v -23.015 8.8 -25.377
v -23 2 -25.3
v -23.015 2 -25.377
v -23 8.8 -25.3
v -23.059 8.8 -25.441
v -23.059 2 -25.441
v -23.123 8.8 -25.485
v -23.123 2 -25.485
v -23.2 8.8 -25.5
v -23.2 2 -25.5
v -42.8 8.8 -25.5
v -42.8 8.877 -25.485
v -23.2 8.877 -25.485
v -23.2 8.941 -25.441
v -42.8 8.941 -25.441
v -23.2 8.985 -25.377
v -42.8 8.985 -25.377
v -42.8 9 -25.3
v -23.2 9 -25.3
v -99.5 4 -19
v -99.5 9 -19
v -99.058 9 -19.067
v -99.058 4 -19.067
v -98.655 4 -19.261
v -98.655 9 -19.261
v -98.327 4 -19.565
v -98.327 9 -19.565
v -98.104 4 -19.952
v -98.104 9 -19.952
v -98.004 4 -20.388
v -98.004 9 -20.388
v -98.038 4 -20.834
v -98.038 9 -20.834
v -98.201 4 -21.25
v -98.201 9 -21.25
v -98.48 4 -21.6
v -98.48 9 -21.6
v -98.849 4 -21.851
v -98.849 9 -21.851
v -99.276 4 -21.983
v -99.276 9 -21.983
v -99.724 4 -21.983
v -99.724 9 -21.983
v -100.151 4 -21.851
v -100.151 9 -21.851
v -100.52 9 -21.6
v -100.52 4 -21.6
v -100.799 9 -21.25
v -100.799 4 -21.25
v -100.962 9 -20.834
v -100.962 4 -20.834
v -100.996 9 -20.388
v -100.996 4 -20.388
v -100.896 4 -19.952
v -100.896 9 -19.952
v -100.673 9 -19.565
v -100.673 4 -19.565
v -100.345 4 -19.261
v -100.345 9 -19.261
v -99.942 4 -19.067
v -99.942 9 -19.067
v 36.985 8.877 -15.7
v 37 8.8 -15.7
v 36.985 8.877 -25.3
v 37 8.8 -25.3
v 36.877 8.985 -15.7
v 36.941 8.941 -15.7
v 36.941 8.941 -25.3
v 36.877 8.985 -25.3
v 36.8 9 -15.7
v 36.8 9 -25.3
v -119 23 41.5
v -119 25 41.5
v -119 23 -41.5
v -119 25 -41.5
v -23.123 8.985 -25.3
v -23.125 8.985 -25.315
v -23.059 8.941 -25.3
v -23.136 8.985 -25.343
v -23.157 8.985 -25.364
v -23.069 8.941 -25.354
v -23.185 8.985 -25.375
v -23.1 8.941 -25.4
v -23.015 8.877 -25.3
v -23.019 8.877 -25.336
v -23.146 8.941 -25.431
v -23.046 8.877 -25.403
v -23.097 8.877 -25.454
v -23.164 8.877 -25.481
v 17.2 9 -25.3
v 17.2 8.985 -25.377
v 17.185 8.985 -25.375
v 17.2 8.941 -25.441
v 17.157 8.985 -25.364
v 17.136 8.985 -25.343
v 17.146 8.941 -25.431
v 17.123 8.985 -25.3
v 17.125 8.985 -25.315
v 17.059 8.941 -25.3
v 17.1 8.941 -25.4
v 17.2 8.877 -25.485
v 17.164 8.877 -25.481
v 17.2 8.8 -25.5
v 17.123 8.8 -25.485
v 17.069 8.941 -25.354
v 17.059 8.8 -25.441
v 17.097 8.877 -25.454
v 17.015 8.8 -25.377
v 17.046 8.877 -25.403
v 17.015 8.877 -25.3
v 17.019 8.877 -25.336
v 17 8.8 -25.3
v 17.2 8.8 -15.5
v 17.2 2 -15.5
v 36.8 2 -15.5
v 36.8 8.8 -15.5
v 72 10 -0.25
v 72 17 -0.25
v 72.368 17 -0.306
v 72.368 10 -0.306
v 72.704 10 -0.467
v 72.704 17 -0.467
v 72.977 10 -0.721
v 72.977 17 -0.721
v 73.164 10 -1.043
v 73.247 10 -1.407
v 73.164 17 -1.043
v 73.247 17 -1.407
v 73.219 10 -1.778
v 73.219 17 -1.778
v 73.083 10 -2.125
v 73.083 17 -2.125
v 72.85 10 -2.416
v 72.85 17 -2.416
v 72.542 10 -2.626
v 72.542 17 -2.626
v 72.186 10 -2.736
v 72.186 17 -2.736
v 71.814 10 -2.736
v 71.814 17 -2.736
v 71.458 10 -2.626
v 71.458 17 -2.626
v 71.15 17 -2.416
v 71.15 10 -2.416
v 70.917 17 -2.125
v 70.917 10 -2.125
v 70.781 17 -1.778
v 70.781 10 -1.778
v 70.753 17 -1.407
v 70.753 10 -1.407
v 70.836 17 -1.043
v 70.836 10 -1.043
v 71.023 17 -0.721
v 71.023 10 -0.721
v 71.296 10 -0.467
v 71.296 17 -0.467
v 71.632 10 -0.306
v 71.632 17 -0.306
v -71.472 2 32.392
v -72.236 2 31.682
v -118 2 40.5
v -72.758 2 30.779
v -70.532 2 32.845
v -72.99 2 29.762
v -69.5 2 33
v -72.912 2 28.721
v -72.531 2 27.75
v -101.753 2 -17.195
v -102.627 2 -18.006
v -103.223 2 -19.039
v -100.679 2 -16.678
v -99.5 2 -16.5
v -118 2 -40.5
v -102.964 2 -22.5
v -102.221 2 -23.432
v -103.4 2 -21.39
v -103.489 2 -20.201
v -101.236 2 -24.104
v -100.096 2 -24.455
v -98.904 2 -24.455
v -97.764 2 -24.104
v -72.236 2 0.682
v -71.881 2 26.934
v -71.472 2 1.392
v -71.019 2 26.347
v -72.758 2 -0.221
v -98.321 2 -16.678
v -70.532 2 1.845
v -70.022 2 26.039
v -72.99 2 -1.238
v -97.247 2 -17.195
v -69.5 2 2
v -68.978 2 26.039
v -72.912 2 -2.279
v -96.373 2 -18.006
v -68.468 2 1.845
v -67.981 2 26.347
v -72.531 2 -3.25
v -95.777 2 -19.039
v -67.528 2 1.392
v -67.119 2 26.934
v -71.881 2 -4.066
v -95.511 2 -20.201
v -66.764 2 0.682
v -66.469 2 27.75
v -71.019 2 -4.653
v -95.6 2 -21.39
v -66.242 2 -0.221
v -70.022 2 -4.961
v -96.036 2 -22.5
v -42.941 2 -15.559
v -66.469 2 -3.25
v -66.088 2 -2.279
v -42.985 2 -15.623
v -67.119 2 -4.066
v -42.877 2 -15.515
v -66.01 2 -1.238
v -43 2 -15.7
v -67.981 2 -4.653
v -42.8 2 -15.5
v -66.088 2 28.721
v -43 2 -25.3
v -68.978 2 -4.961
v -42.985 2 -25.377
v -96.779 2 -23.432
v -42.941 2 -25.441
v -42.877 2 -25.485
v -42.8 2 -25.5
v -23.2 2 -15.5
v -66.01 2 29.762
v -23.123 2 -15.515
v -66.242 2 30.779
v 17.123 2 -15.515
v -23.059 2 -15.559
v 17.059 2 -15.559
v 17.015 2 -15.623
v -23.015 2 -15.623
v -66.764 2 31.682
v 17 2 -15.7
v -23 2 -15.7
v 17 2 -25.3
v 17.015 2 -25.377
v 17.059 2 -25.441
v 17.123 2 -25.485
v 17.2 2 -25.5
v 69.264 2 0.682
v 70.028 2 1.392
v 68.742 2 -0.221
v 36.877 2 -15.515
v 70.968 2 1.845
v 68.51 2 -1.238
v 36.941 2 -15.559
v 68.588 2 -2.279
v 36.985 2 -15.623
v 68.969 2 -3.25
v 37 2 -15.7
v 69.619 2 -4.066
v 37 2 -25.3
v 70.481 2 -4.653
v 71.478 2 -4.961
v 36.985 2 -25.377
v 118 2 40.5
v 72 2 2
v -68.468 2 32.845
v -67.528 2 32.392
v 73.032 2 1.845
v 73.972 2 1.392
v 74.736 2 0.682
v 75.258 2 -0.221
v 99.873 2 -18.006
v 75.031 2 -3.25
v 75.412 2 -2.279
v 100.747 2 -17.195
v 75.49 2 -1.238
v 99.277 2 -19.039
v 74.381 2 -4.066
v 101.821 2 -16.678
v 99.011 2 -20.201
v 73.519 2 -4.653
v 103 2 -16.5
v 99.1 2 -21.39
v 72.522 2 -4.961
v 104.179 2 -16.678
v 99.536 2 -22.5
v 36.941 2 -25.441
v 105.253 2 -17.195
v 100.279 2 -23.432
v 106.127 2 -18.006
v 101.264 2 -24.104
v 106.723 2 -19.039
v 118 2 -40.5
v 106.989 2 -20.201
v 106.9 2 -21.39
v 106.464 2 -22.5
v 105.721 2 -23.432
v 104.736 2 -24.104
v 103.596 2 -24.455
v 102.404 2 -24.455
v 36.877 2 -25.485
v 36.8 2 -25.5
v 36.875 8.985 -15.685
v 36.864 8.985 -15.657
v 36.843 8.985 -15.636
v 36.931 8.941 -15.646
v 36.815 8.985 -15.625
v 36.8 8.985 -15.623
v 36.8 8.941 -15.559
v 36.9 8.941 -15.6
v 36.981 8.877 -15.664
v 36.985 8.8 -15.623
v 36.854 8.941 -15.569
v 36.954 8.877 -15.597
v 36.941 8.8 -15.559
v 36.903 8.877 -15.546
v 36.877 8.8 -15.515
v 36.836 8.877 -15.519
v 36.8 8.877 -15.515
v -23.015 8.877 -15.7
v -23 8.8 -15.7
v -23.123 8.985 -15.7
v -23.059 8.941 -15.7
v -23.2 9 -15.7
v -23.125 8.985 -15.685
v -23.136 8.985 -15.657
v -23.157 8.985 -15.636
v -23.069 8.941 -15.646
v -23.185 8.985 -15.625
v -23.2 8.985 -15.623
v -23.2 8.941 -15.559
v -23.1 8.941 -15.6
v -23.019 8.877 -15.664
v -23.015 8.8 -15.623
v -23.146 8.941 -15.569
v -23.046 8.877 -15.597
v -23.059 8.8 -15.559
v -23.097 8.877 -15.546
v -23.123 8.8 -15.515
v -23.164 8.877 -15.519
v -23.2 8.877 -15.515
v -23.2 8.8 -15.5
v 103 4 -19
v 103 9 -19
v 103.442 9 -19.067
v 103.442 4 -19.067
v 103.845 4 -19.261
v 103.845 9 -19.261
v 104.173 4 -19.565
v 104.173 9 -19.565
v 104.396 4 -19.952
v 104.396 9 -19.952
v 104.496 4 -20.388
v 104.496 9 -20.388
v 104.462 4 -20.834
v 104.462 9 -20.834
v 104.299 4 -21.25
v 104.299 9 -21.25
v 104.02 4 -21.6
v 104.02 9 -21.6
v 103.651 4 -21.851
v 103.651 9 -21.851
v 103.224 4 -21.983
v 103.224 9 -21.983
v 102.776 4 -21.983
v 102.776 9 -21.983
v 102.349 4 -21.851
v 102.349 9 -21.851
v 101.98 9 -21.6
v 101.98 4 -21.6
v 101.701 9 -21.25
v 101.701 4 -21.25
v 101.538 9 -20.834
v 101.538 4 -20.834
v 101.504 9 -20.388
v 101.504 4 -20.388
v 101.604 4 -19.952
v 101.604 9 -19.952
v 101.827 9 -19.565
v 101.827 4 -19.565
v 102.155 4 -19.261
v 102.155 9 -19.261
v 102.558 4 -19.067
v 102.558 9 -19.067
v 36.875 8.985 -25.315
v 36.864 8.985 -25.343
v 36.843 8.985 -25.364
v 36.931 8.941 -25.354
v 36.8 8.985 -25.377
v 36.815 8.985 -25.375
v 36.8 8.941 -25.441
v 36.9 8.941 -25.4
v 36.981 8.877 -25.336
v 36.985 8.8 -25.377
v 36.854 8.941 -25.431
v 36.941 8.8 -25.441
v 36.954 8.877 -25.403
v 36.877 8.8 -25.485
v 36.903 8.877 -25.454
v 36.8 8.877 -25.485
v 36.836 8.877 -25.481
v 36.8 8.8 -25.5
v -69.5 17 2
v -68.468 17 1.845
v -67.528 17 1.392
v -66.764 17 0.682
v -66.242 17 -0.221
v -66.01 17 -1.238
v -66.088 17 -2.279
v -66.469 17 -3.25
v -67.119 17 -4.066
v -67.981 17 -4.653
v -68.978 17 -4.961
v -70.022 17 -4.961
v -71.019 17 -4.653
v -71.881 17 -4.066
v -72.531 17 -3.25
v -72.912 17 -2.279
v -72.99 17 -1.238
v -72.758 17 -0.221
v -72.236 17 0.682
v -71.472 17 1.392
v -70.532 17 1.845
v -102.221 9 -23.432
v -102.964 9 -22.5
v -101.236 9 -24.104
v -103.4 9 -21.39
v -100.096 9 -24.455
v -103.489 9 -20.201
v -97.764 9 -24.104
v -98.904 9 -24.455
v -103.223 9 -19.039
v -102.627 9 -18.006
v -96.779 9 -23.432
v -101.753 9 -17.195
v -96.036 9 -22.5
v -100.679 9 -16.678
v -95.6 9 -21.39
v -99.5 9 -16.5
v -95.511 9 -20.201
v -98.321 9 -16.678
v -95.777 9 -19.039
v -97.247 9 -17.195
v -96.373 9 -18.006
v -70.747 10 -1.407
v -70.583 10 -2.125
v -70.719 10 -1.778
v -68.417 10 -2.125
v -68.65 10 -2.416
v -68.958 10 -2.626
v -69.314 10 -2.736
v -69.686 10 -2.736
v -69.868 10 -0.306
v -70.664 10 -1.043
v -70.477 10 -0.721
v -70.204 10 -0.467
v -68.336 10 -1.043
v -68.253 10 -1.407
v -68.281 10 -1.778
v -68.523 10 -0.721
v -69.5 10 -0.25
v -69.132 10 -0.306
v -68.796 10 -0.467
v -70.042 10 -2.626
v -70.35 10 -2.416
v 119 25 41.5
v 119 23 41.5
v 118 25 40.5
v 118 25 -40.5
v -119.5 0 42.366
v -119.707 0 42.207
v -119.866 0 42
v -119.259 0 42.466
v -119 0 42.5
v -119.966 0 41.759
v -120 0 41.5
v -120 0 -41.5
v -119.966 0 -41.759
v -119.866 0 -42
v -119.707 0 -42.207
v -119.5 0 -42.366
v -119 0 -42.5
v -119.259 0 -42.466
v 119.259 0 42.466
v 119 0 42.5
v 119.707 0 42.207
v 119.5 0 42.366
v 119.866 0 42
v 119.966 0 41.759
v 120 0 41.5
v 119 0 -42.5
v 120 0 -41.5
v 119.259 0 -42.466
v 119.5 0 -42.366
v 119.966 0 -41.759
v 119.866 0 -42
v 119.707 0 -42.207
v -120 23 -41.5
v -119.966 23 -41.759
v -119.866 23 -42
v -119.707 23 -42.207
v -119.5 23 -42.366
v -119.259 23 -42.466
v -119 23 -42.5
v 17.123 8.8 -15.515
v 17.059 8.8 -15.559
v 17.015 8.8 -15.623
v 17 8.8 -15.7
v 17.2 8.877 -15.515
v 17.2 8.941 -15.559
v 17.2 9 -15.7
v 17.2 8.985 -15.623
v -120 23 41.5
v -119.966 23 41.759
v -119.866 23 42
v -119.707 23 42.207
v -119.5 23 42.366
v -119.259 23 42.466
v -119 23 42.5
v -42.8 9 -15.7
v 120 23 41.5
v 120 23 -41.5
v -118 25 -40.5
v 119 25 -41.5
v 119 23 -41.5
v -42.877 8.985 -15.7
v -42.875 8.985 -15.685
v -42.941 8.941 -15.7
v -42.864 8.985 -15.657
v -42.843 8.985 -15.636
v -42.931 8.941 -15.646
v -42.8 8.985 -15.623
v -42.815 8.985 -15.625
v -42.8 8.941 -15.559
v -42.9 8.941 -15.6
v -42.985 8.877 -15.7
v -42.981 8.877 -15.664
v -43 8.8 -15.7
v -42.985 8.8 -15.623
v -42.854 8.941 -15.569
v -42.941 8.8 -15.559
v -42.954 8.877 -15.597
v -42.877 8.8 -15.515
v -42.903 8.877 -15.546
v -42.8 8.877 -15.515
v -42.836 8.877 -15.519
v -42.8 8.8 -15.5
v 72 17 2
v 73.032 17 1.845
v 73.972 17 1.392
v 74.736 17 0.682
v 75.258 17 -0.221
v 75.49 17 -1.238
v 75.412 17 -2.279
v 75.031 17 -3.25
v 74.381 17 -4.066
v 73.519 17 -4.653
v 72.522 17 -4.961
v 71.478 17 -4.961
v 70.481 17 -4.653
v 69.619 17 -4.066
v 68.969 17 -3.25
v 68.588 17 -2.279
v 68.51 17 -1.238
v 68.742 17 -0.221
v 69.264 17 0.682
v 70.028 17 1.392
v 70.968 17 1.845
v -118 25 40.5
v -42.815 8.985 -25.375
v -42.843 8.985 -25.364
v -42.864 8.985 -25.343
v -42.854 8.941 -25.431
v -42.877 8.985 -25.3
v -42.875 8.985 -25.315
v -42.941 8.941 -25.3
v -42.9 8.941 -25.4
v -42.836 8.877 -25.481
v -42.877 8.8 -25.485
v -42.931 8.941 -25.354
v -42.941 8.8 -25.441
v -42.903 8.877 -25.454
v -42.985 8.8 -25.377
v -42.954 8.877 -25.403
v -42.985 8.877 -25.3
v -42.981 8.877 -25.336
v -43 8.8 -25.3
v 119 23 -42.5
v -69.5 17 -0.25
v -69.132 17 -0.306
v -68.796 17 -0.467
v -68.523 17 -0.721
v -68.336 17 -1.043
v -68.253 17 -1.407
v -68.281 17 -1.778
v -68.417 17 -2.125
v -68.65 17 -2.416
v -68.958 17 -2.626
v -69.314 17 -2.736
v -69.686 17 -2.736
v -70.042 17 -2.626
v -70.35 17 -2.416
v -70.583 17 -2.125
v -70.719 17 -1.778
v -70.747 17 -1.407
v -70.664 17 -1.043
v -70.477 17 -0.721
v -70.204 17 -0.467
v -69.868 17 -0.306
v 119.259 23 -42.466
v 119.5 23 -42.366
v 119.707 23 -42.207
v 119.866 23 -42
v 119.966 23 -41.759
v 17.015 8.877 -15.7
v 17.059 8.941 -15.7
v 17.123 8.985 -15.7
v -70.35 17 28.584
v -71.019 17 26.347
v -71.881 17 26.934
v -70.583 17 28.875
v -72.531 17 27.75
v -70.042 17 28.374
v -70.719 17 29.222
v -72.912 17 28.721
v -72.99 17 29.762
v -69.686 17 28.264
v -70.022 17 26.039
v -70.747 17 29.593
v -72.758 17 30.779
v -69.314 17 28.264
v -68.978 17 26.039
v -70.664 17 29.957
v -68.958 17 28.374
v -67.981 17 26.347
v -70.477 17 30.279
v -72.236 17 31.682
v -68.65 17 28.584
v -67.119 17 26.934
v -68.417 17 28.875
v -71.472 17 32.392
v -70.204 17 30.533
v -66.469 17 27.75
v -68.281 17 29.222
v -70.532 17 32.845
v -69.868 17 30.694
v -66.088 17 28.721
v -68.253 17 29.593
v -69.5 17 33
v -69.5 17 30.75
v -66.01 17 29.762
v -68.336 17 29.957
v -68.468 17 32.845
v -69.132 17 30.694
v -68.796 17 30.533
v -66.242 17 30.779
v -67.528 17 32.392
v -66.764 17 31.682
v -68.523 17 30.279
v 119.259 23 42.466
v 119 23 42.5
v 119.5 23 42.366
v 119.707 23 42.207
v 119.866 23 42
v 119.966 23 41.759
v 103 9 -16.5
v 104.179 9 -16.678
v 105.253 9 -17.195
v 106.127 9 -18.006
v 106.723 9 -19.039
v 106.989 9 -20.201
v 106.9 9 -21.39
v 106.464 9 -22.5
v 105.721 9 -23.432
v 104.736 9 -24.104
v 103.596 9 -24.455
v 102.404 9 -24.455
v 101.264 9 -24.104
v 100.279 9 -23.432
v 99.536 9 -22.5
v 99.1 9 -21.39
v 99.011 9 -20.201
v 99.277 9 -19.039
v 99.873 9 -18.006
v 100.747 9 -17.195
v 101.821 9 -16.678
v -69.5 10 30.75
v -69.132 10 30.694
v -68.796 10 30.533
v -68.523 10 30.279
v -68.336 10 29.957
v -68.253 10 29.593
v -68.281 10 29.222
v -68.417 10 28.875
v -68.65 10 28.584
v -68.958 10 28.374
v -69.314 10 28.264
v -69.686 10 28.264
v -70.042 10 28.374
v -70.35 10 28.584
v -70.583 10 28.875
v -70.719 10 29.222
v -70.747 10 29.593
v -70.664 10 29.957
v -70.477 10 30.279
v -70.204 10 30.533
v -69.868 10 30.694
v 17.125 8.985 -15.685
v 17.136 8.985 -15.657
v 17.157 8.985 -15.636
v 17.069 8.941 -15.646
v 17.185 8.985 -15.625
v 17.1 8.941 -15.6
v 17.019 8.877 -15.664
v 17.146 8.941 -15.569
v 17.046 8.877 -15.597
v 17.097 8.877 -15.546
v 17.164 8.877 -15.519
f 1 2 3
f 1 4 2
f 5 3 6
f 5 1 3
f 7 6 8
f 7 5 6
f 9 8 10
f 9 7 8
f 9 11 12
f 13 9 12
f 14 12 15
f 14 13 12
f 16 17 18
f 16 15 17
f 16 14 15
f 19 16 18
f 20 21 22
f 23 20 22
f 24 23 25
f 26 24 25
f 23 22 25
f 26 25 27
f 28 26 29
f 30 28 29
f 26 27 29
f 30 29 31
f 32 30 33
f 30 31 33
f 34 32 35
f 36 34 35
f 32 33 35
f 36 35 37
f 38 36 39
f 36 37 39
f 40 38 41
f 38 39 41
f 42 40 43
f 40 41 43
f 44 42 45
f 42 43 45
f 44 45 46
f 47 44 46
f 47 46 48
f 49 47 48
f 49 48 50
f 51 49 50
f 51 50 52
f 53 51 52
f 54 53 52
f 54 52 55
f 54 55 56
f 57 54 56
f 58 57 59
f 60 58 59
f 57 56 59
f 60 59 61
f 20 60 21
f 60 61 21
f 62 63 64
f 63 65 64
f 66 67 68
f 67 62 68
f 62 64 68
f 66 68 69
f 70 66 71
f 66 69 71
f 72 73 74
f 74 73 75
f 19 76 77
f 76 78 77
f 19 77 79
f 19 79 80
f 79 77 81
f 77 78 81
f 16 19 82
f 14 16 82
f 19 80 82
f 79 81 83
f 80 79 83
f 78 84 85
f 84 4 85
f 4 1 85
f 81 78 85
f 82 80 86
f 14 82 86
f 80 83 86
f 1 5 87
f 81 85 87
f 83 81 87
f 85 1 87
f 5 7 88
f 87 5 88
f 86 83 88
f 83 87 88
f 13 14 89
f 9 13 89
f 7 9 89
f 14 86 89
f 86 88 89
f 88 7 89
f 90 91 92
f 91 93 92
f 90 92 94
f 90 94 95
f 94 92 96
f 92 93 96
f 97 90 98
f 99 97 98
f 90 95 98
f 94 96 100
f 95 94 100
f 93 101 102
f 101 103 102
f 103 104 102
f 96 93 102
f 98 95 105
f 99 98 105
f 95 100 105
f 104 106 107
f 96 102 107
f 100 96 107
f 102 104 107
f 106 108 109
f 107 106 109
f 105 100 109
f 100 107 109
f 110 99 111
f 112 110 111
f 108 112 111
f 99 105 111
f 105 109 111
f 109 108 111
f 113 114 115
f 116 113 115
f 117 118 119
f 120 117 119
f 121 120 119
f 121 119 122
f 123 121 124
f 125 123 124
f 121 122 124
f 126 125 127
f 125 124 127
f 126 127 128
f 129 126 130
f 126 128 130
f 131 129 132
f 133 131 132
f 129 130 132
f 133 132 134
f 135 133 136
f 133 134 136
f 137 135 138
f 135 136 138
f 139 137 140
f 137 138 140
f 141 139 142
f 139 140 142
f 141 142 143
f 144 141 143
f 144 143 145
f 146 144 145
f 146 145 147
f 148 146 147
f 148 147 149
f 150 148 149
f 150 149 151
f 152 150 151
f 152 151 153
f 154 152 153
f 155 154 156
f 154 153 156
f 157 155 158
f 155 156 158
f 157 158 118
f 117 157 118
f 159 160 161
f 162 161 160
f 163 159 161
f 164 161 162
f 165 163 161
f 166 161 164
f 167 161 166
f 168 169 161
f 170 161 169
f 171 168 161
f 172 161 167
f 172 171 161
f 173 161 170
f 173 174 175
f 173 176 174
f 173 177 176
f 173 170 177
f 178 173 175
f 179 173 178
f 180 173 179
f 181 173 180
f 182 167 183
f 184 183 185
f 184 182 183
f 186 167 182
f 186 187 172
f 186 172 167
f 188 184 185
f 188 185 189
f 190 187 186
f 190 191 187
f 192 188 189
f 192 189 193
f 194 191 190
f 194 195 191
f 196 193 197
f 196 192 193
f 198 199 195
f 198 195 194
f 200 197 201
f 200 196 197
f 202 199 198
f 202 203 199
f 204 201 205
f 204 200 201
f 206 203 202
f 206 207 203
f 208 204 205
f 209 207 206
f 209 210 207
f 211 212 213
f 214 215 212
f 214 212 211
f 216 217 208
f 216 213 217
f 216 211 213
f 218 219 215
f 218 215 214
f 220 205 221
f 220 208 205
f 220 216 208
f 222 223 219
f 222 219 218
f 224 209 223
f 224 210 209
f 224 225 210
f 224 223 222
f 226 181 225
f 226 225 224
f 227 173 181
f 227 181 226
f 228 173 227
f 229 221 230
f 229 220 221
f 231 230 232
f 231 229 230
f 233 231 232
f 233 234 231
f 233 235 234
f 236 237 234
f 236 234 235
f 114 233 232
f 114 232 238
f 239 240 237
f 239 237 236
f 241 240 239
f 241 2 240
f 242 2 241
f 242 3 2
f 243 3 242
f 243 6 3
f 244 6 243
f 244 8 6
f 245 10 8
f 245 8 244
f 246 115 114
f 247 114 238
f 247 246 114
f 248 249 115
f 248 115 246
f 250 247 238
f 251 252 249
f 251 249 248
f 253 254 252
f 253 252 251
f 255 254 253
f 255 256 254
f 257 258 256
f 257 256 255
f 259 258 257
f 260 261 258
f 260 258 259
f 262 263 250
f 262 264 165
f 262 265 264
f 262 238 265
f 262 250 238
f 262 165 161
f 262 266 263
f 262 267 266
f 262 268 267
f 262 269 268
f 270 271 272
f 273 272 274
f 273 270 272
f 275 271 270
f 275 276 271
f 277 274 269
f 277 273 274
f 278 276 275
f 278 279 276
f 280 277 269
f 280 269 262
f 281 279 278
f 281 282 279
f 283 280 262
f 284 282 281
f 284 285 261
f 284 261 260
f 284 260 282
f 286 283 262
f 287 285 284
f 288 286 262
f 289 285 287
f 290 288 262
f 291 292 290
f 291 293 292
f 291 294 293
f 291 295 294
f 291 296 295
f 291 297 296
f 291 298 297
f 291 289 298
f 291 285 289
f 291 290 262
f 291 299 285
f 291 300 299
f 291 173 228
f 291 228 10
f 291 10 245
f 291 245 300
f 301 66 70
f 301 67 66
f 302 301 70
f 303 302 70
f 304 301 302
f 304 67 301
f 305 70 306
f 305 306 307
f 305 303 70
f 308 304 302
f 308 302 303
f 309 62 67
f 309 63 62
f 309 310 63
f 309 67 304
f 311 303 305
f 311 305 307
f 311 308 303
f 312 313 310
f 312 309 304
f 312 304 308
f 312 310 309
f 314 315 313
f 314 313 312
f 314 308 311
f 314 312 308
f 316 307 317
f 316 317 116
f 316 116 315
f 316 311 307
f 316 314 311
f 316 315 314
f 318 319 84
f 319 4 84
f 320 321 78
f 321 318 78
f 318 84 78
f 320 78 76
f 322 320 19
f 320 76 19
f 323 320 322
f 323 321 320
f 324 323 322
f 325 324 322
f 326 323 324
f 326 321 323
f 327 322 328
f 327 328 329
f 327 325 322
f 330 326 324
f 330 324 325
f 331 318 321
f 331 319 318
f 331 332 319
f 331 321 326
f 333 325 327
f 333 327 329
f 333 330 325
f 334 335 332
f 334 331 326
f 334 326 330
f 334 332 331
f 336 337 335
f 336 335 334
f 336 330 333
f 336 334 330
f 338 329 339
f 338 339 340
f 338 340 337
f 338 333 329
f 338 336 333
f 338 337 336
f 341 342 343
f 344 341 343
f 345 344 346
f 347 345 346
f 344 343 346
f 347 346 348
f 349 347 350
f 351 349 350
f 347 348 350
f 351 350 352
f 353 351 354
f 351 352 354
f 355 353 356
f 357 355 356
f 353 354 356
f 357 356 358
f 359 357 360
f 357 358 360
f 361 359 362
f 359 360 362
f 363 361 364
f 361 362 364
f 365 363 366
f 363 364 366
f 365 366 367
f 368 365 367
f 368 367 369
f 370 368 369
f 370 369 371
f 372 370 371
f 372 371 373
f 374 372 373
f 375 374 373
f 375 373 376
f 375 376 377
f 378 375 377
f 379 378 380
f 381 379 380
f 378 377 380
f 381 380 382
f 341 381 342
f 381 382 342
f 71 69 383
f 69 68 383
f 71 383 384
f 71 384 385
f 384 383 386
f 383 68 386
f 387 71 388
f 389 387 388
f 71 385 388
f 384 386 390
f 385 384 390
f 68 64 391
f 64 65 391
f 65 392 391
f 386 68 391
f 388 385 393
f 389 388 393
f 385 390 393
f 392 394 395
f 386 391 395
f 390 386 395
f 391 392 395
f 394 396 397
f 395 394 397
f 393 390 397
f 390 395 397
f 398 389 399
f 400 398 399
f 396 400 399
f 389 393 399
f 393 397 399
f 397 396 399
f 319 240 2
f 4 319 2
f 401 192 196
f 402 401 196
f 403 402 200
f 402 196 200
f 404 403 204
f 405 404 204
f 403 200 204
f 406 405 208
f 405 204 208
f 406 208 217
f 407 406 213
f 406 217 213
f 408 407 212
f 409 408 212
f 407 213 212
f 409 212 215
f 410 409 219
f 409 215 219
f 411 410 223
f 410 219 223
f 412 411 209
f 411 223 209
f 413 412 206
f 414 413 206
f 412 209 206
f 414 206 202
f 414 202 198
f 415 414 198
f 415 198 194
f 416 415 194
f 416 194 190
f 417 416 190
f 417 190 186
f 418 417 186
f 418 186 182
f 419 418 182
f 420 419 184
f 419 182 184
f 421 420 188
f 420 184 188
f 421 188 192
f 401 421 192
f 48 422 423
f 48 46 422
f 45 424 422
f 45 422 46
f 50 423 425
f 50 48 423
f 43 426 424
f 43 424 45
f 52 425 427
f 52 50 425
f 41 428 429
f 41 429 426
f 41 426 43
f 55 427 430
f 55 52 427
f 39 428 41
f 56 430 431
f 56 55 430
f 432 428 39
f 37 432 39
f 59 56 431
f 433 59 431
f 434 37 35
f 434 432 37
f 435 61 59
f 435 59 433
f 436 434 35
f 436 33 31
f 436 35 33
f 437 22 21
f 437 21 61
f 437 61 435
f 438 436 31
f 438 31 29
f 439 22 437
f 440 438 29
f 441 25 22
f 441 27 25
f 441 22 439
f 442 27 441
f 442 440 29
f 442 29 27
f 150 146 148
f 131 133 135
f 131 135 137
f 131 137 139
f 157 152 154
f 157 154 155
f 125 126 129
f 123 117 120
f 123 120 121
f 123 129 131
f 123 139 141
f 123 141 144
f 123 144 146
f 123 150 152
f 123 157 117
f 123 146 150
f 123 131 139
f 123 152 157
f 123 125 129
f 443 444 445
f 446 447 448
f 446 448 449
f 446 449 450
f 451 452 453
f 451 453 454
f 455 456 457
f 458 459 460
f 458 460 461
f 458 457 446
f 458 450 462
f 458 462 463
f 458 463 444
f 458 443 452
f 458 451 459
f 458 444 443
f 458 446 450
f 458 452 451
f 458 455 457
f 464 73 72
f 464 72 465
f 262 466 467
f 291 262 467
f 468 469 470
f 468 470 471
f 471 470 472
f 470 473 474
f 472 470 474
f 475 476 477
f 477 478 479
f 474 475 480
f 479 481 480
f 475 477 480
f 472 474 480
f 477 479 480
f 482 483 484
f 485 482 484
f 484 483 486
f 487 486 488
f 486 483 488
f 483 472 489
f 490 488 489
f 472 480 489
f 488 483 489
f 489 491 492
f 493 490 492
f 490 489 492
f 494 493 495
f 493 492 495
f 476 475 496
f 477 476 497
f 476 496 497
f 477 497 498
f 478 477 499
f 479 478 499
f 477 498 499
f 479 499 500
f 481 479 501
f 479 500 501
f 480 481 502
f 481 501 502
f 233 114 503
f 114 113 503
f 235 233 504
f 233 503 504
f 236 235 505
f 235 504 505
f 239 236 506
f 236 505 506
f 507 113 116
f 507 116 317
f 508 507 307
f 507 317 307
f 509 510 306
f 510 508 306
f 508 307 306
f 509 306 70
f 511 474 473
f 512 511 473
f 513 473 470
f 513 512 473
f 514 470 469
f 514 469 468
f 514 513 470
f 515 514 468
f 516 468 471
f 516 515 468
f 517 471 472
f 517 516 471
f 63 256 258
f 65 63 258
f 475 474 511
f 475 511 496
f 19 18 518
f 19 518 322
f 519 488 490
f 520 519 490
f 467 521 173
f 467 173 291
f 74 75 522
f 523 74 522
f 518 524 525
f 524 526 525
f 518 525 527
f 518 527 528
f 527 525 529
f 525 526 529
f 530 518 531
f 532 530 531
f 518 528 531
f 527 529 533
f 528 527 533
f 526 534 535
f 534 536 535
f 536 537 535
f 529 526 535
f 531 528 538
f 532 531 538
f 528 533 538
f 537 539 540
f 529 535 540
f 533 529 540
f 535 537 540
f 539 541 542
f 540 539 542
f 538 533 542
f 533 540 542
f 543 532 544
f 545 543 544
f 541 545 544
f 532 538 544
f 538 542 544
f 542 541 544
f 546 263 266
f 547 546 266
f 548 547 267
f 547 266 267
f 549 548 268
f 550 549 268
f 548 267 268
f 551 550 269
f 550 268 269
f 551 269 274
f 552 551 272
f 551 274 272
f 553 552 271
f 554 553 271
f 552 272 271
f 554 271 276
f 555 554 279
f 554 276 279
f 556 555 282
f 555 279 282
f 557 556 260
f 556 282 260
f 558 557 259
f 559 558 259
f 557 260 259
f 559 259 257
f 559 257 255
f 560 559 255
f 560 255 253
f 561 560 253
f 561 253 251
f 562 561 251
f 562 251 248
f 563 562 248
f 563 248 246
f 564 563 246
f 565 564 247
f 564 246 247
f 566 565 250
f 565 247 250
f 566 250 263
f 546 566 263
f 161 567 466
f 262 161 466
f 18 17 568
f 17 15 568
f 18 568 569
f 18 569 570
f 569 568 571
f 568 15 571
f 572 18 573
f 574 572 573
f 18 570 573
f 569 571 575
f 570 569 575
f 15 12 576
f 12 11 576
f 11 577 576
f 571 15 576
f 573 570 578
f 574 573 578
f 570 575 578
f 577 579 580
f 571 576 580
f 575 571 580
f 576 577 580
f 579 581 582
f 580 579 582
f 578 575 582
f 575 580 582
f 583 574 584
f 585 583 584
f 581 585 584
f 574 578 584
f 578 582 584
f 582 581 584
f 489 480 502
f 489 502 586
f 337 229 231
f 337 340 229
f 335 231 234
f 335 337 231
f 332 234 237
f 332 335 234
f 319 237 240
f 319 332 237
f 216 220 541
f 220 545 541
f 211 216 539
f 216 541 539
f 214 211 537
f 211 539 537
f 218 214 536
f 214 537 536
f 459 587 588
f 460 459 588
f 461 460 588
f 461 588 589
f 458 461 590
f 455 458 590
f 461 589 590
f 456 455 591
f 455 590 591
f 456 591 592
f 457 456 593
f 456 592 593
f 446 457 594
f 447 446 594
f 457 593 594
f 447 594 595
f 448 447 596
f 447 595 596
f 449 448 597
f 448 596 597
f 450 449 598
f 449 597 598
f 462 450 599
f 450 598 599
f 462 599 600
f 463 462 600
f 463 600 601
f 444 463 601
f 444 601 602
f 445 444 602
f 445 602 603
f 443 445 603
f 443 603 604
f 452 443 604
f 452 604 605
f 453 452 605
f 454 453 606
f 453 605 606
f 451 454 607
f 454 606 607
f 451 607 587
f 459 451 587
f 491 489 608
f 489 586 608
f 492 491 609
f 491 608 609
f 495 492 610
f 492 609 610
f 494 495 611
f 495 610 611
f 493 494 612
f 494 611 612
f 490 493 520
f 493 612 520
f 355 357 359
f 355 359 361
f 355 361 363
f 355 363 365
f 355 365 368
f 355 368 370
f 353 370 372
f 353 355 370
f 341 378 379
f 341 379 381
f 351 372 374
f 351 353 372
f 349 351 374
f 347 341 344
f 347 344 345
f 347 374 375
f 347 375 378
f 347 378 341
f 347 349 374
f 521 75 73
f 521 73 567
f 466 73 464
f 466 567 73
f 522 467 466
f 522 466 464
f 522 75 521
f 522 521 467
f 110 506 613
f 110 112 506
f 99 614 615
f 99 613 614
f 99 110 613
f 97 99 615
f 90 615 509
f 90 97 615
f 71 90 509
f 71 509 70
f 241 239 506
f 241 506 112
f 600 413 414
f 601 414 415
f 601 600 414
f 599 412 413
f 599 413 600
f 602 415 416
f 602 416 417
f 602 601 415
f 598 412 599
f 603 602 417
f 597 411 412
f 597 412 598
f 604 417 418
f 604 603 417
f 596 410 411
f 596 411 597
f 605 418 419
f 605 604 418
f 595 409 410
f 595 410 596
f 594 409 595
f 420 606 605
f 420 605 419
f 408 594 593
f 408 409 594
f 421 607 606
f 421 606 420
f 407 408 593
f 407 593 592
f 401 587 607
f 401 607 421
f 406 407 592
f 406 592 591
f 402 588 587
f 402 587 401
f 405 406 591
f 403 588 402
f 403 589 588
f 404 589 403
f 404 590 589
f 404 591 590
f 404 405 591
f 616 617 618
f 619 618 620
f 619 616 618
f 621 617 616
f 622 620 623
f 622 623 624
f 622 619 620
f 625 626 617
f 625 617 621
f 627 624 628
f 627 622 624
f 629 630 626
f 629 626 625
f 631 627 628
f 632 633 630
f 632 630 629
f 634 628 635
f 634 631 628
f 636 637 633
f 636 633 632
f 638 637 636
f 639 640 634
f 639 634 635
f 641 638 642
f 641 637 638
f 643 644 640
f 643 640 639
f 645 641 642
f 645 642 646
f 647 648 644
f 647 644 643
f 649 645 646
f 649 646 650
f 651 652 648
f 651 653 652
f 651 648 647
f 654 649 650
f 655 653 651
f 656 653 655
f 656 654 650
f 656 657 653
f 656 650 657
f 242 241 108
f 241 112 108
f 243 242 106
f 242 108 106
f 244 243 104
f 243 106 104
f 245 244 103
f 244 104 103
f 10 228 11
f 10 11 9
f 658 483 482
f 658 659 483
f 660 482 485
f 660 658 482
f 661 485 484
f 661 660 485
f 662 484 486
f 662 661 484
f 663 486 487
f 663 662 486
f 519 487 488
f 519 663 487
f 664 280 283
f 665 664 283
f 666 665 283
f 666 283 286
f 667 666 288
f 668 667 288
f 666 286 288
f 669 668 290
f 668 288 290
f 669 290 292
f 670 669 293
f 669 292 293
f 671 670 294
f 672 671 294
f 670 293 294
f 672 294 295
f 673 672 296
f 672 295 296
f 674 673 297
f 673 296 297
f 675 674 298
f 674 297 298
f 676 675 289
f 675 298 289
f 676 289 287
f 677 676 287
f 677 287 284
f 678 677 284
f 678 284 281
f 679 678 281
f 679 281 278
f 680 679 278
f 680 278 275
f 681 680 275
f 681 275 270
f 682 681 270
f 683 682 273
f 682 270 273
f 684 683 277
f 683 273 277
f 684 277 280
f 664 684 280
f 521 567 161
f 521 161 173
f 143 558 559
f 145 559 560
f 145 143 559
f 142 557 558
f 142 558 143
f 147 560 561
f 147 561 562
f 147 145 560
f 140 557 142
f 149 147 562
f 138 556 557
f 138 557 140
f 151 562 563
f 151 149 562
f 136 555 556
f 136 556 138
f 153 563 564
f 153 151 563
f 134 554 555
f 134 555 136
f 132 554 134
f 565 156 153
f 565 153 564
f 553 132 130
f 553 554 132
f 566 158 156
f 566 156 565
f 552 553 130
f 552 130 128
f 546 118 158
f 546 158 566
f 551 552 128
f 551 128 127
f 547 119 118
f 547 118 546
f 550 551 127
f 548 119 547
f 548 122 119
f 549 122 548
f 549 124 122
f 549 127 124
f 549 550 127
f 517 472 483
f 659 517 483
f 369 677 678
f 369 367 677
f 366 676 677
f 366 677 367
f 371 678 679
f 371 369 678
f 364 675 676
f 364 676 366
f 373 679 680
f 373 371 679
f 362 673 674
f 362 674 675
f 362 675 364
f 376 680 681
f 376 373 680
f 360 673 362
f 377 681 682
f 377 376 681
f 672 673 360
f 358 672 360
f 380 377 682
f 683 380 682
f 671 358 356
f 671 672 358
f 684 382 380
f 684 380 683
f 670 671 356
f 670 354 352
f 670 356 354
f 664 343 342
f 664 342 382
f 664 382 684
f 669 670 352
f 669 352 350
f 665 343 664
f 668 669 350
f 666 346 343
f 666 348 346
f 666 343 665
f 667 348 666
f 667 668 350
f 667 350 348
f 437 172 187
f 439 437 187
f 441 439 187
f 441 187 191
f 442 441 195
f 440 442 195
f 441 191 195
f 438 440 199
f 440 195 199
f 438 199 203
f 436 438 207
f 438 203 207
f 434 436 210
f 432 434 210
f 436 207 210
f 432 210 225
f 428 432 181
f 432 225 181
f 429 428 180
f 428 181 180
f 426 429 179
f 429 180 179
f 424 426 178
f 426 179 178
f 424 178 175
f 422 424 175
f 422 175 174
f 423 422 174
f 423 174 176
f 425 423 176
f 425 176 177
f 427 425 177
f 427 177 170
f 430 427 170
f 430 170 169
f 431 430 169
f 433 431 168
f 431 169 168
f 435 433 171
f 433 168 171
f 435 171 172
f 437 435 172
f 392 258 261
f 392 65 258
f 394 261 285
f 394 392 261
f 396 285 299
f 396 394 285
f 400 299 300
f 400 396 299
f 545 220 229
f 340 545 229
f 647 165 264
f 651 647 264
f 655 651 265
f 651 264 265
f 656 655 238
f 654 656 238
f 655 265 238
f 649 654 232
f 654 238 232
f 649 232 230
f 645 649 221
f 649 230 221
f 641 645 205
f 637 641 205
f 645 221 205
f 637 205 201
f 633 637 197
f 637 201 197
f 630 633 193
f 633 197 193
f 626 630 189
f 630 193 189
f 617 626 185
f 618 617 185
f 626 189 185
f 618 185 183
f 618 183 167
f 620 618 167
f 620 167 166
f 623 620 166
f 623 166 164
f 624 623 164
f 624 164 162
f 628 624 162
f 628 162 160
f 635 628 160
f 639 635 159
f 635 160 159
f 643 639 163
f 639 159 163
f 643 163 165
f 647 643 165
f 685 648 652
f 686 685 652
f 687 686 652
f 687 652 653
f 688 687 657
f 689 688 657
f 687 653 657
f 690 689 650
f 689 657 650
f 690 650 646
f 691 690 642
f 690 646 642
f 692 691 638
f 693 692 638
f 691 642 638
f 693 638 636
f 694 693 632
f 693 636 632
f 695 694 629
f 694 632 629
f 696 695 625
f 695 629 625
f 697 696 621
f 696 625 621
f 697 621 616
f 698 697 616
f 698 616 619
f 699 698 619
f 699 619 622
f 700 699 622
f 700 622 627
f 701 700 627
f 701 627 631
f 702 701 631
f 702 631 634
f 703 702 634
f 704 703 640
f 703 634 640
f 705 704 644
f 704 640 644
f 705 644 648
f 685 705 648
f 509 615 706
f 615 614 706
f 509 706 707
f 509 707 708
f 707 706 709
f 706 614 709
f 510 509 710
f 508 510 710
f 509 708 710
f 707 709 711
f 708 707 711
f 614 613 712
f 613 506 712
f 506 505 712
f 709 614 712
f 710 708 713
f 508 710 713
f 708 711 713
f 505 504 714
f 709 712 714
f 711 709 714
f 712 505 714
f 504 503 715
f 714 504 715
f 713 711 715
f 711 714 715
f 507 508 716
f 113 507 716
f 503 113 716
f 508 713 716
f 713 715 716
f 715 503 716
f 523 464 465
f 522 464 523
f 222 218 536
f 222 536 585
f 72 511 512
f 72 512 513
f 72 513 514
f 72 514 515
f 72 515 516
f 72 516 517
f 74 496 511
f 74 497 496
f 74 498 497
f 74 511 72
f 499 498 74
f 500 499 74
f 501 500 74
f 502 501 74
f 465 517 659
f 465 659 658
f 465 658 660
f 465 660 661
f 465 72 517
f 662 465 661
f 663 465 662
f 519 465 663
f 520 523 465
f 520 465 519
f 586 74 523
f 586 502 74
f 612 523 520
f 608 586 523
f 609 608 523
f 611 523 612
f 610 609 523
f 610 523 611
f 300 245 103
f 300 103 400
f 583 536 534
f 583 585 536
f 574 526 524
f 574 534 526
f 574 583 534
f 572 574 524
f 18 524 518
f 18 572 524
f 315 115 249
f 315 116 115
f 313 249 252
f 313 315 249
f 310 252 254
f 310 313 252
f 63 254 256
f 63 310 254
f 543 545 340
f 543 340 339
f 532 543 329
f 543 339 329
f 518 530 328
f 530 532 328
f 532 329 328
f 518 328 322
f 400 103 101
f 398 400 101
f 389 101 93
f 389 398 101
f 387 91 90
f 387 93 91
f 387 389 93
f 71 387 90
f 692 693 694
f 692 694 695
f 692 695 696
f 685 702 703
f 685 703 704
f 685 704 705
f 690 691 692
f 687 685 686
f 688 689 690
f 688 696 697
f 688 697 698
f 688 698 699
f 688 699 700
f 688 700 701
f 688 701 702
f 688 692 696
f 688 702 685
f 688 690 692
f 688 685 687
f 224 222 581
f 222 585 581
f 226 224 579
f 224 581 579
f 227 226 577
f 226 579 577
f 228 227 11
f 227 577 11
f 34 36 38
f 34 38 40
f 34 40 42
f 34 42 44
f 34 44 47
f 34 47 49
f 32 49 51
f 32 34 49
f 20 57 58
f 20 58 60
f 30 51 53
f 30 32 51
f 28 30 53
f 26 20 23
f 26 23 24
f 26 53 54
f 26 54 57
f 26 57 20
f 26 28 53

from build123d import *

# Parameters (mm, degrees)
SKETCH1_W           = 240
SKETCH1_H           = 85
BOSS_EXTRUDE1_DEPTH = 25
SKETCH2_W           = 236
SKETCH2_H           = 81
CUT_EXTRUDE1_DEPTH  = 23
SKETCH3_W           = 240
SKETCH3_H           = 85
SKETCH3_W_2         = 238
SKETCH3_H_2         = 83
CUT_EXTRUDE2_DEPTH  = 2
SKETCH5_R           = 4
SKETCH5_W           = 20
SKETCH5_H           = 10
BOSS_EXTRUDE2_DEPTH = 7
SKETCH6_R           = 1.5
CUT_EXTRUDE3_DEPTH  = 5
SKETCH7_R           = 3.5
BOSS_EXTRUDE3_DEPTH = 15
SKETCH8_R           = 1.25
CUT_EXTRUDE4_DEPTH  = 7
FILLET1_R           = 0.2
FILLET2_R           = 1


with BuildPart() as part:
    # Sketch1 → Boss-Extrude1 (new body)
    with BuildSketch(Plane(origin=(0, 0, 0), x_dir=(1, 0, 0), z_dir=(0, 1, 0))):
        Rectangle(SKETCH1_W, SKETCH1_H)
    extrude(amount=BOSS_EXTRUDE1_DEPTH)

    # Sketch2 → Cut-Extrude1 (cut)
    with BuildSketch(Plane(origin=(0, 25, 0), x_dir=(1, 0, 0), z_dir=(0, 1, 0))):
        Rectangle(SKETCH2_W, SKETCH2_H)
    extrude(amount=-CUT_EXTRUDE1_DEPTH, mode=Mode.SUBTRACT)

    # Sketch3 → Cut-Extrude2 (cut)
    with BuildSketch(Plane(origin=(0, 25, 0), x_dir=(1, 0, 0), z_dir=(0, 1, 0))):
        Rectangle(SKETCH3_W, SKETCH3_H)
        Rectangle(SKETCH3_W_2, SKETCH3_H_2, mode=Mode.SUBTRACT)
    extrude(amount=-CUT_EXTRUDE2_DEPTH, mode=Mode.SUBTRACT)

    # Sketch5 → Boss-Extrude2 (add)
    with BuildSketch(Plane(origin=(0, 2, 0), x_dir=(1, 0, 0), z_dir=(0, 1, 0))):
        with Locations(Location((-99.5, 20.5, 0), (0, 0, 270))):
            Circle(SKETCH5_R)
        with Locations(Location((103, 20.5, 0), (0, 0, 270))):
            Circle(SKETCH5_R)
        with Locations((-33, 20.5)):
            Rectangle(SKETCH5_W, SKETCH5_H)
        with Locations((27, 20.5)):
            Rectangle(SKETCH5_W, SKETCH5_H)
    extrude(amount=BOSS_EXTRUDE2_DEPTH)

    # Sketch6 → Cut-Extrude3 (cut)
    with BuildSketch(Plane(origin=(0, 9, 0), x_dir=(1, 0, 0), z_dir=(0, 1, 0))):
        with Locations(Location((-99.5, 20.5, 0), (0, 0, 270))):
            Circle(SKETCH6_R)
        with Locations(Location((103, 20.5, 0), (0, 0, 270))):
            Circle(SKETCH6_R)
    extrude(amount=-CUT_EXTRUDE3_DEPTH, mode=Mode.SUBTRACT)

    # Sketch7 → Boss-Extrude3 (add)
    with BuildSketch(Plane(origin=(0, 2, 0), x_dir=(1, 0, 0), z_dir=(0, 1, 0))):
        with Locations(Location((72, 1.5, 0), (0, 0, 270))):
            Circle(SKETCH7_R)
        with Locations(Location((-69.5, -29.5, 0), (0, 0, 270))):
            Circle(SKETCH7_R)
        with Locations(Location((-69.5, 1.5, 0), (0, 0, 270))):
            Circle(SKETCH7_R)
    extrude(amount=BOSS_EXTRUDE3_DEPTH)

    # Sketch8 → Cut-Extrude4 (cut)
    with BuildSketch(Plane(origin=(0, 17, 0), x_dir=(1, 0, 0), z_dir=(0, 1, 0))):
        with Locations(Location((72, 1.5, 0), (0, 0, 270))):
            Circle(SKETCH8_R)
        with Locations(Location((-69.5, -29.5, 0), (0, 0, 270))):
            Circle(SKETCH8_R)
        with Locations(Location((-69.5, 1.5, 0), (0, 0, 270))):
            Circle(SKETCH8_R)
    extrude(amount=-CUT_EXTRUDE4_DEPTH, mode=Mode.SUBTRACT)

    # Fillet1
    fillet1_edges = [part.edges().sort_by_distance(p)[0] for p in [
        (-23, 5.5, -15.5),
        (-23, 5.5, -25.5),
        (-43, 5.5, -25.5),
        (-43, 5.5, -15.5),
        (-23, 9, -20.5),
        (-33, 9, -25.5),
        (-43, 9, -20.5),
        (-33, 9, -15.5),
        (37, 5.5, -15.5),
        (37, 5.5, -25.5),
        (17, 5.5, -25.5),
        (17, 5.5, -15.5),
        (37, 9, -20.5),
        (27, 9, -25.5),
        (17, 9, -20.5),
        (27, 9, -15.5),
    ]]
    fillet(fillet1_edges, radius=FILLET1_R)

    # Fillet2
    fillet2_edges = [part.edges().sort_by_distance(p)[0] for p in [
        (120, 11.5, 42.5),
        (-120, 11.5, 42.5),
        (-120, 11.5, -42.5),
        (120, 11.5, -42.5),
    ]]
    fillet(fillet2_edges, radius=FILLET2_R)


solid = part.part
